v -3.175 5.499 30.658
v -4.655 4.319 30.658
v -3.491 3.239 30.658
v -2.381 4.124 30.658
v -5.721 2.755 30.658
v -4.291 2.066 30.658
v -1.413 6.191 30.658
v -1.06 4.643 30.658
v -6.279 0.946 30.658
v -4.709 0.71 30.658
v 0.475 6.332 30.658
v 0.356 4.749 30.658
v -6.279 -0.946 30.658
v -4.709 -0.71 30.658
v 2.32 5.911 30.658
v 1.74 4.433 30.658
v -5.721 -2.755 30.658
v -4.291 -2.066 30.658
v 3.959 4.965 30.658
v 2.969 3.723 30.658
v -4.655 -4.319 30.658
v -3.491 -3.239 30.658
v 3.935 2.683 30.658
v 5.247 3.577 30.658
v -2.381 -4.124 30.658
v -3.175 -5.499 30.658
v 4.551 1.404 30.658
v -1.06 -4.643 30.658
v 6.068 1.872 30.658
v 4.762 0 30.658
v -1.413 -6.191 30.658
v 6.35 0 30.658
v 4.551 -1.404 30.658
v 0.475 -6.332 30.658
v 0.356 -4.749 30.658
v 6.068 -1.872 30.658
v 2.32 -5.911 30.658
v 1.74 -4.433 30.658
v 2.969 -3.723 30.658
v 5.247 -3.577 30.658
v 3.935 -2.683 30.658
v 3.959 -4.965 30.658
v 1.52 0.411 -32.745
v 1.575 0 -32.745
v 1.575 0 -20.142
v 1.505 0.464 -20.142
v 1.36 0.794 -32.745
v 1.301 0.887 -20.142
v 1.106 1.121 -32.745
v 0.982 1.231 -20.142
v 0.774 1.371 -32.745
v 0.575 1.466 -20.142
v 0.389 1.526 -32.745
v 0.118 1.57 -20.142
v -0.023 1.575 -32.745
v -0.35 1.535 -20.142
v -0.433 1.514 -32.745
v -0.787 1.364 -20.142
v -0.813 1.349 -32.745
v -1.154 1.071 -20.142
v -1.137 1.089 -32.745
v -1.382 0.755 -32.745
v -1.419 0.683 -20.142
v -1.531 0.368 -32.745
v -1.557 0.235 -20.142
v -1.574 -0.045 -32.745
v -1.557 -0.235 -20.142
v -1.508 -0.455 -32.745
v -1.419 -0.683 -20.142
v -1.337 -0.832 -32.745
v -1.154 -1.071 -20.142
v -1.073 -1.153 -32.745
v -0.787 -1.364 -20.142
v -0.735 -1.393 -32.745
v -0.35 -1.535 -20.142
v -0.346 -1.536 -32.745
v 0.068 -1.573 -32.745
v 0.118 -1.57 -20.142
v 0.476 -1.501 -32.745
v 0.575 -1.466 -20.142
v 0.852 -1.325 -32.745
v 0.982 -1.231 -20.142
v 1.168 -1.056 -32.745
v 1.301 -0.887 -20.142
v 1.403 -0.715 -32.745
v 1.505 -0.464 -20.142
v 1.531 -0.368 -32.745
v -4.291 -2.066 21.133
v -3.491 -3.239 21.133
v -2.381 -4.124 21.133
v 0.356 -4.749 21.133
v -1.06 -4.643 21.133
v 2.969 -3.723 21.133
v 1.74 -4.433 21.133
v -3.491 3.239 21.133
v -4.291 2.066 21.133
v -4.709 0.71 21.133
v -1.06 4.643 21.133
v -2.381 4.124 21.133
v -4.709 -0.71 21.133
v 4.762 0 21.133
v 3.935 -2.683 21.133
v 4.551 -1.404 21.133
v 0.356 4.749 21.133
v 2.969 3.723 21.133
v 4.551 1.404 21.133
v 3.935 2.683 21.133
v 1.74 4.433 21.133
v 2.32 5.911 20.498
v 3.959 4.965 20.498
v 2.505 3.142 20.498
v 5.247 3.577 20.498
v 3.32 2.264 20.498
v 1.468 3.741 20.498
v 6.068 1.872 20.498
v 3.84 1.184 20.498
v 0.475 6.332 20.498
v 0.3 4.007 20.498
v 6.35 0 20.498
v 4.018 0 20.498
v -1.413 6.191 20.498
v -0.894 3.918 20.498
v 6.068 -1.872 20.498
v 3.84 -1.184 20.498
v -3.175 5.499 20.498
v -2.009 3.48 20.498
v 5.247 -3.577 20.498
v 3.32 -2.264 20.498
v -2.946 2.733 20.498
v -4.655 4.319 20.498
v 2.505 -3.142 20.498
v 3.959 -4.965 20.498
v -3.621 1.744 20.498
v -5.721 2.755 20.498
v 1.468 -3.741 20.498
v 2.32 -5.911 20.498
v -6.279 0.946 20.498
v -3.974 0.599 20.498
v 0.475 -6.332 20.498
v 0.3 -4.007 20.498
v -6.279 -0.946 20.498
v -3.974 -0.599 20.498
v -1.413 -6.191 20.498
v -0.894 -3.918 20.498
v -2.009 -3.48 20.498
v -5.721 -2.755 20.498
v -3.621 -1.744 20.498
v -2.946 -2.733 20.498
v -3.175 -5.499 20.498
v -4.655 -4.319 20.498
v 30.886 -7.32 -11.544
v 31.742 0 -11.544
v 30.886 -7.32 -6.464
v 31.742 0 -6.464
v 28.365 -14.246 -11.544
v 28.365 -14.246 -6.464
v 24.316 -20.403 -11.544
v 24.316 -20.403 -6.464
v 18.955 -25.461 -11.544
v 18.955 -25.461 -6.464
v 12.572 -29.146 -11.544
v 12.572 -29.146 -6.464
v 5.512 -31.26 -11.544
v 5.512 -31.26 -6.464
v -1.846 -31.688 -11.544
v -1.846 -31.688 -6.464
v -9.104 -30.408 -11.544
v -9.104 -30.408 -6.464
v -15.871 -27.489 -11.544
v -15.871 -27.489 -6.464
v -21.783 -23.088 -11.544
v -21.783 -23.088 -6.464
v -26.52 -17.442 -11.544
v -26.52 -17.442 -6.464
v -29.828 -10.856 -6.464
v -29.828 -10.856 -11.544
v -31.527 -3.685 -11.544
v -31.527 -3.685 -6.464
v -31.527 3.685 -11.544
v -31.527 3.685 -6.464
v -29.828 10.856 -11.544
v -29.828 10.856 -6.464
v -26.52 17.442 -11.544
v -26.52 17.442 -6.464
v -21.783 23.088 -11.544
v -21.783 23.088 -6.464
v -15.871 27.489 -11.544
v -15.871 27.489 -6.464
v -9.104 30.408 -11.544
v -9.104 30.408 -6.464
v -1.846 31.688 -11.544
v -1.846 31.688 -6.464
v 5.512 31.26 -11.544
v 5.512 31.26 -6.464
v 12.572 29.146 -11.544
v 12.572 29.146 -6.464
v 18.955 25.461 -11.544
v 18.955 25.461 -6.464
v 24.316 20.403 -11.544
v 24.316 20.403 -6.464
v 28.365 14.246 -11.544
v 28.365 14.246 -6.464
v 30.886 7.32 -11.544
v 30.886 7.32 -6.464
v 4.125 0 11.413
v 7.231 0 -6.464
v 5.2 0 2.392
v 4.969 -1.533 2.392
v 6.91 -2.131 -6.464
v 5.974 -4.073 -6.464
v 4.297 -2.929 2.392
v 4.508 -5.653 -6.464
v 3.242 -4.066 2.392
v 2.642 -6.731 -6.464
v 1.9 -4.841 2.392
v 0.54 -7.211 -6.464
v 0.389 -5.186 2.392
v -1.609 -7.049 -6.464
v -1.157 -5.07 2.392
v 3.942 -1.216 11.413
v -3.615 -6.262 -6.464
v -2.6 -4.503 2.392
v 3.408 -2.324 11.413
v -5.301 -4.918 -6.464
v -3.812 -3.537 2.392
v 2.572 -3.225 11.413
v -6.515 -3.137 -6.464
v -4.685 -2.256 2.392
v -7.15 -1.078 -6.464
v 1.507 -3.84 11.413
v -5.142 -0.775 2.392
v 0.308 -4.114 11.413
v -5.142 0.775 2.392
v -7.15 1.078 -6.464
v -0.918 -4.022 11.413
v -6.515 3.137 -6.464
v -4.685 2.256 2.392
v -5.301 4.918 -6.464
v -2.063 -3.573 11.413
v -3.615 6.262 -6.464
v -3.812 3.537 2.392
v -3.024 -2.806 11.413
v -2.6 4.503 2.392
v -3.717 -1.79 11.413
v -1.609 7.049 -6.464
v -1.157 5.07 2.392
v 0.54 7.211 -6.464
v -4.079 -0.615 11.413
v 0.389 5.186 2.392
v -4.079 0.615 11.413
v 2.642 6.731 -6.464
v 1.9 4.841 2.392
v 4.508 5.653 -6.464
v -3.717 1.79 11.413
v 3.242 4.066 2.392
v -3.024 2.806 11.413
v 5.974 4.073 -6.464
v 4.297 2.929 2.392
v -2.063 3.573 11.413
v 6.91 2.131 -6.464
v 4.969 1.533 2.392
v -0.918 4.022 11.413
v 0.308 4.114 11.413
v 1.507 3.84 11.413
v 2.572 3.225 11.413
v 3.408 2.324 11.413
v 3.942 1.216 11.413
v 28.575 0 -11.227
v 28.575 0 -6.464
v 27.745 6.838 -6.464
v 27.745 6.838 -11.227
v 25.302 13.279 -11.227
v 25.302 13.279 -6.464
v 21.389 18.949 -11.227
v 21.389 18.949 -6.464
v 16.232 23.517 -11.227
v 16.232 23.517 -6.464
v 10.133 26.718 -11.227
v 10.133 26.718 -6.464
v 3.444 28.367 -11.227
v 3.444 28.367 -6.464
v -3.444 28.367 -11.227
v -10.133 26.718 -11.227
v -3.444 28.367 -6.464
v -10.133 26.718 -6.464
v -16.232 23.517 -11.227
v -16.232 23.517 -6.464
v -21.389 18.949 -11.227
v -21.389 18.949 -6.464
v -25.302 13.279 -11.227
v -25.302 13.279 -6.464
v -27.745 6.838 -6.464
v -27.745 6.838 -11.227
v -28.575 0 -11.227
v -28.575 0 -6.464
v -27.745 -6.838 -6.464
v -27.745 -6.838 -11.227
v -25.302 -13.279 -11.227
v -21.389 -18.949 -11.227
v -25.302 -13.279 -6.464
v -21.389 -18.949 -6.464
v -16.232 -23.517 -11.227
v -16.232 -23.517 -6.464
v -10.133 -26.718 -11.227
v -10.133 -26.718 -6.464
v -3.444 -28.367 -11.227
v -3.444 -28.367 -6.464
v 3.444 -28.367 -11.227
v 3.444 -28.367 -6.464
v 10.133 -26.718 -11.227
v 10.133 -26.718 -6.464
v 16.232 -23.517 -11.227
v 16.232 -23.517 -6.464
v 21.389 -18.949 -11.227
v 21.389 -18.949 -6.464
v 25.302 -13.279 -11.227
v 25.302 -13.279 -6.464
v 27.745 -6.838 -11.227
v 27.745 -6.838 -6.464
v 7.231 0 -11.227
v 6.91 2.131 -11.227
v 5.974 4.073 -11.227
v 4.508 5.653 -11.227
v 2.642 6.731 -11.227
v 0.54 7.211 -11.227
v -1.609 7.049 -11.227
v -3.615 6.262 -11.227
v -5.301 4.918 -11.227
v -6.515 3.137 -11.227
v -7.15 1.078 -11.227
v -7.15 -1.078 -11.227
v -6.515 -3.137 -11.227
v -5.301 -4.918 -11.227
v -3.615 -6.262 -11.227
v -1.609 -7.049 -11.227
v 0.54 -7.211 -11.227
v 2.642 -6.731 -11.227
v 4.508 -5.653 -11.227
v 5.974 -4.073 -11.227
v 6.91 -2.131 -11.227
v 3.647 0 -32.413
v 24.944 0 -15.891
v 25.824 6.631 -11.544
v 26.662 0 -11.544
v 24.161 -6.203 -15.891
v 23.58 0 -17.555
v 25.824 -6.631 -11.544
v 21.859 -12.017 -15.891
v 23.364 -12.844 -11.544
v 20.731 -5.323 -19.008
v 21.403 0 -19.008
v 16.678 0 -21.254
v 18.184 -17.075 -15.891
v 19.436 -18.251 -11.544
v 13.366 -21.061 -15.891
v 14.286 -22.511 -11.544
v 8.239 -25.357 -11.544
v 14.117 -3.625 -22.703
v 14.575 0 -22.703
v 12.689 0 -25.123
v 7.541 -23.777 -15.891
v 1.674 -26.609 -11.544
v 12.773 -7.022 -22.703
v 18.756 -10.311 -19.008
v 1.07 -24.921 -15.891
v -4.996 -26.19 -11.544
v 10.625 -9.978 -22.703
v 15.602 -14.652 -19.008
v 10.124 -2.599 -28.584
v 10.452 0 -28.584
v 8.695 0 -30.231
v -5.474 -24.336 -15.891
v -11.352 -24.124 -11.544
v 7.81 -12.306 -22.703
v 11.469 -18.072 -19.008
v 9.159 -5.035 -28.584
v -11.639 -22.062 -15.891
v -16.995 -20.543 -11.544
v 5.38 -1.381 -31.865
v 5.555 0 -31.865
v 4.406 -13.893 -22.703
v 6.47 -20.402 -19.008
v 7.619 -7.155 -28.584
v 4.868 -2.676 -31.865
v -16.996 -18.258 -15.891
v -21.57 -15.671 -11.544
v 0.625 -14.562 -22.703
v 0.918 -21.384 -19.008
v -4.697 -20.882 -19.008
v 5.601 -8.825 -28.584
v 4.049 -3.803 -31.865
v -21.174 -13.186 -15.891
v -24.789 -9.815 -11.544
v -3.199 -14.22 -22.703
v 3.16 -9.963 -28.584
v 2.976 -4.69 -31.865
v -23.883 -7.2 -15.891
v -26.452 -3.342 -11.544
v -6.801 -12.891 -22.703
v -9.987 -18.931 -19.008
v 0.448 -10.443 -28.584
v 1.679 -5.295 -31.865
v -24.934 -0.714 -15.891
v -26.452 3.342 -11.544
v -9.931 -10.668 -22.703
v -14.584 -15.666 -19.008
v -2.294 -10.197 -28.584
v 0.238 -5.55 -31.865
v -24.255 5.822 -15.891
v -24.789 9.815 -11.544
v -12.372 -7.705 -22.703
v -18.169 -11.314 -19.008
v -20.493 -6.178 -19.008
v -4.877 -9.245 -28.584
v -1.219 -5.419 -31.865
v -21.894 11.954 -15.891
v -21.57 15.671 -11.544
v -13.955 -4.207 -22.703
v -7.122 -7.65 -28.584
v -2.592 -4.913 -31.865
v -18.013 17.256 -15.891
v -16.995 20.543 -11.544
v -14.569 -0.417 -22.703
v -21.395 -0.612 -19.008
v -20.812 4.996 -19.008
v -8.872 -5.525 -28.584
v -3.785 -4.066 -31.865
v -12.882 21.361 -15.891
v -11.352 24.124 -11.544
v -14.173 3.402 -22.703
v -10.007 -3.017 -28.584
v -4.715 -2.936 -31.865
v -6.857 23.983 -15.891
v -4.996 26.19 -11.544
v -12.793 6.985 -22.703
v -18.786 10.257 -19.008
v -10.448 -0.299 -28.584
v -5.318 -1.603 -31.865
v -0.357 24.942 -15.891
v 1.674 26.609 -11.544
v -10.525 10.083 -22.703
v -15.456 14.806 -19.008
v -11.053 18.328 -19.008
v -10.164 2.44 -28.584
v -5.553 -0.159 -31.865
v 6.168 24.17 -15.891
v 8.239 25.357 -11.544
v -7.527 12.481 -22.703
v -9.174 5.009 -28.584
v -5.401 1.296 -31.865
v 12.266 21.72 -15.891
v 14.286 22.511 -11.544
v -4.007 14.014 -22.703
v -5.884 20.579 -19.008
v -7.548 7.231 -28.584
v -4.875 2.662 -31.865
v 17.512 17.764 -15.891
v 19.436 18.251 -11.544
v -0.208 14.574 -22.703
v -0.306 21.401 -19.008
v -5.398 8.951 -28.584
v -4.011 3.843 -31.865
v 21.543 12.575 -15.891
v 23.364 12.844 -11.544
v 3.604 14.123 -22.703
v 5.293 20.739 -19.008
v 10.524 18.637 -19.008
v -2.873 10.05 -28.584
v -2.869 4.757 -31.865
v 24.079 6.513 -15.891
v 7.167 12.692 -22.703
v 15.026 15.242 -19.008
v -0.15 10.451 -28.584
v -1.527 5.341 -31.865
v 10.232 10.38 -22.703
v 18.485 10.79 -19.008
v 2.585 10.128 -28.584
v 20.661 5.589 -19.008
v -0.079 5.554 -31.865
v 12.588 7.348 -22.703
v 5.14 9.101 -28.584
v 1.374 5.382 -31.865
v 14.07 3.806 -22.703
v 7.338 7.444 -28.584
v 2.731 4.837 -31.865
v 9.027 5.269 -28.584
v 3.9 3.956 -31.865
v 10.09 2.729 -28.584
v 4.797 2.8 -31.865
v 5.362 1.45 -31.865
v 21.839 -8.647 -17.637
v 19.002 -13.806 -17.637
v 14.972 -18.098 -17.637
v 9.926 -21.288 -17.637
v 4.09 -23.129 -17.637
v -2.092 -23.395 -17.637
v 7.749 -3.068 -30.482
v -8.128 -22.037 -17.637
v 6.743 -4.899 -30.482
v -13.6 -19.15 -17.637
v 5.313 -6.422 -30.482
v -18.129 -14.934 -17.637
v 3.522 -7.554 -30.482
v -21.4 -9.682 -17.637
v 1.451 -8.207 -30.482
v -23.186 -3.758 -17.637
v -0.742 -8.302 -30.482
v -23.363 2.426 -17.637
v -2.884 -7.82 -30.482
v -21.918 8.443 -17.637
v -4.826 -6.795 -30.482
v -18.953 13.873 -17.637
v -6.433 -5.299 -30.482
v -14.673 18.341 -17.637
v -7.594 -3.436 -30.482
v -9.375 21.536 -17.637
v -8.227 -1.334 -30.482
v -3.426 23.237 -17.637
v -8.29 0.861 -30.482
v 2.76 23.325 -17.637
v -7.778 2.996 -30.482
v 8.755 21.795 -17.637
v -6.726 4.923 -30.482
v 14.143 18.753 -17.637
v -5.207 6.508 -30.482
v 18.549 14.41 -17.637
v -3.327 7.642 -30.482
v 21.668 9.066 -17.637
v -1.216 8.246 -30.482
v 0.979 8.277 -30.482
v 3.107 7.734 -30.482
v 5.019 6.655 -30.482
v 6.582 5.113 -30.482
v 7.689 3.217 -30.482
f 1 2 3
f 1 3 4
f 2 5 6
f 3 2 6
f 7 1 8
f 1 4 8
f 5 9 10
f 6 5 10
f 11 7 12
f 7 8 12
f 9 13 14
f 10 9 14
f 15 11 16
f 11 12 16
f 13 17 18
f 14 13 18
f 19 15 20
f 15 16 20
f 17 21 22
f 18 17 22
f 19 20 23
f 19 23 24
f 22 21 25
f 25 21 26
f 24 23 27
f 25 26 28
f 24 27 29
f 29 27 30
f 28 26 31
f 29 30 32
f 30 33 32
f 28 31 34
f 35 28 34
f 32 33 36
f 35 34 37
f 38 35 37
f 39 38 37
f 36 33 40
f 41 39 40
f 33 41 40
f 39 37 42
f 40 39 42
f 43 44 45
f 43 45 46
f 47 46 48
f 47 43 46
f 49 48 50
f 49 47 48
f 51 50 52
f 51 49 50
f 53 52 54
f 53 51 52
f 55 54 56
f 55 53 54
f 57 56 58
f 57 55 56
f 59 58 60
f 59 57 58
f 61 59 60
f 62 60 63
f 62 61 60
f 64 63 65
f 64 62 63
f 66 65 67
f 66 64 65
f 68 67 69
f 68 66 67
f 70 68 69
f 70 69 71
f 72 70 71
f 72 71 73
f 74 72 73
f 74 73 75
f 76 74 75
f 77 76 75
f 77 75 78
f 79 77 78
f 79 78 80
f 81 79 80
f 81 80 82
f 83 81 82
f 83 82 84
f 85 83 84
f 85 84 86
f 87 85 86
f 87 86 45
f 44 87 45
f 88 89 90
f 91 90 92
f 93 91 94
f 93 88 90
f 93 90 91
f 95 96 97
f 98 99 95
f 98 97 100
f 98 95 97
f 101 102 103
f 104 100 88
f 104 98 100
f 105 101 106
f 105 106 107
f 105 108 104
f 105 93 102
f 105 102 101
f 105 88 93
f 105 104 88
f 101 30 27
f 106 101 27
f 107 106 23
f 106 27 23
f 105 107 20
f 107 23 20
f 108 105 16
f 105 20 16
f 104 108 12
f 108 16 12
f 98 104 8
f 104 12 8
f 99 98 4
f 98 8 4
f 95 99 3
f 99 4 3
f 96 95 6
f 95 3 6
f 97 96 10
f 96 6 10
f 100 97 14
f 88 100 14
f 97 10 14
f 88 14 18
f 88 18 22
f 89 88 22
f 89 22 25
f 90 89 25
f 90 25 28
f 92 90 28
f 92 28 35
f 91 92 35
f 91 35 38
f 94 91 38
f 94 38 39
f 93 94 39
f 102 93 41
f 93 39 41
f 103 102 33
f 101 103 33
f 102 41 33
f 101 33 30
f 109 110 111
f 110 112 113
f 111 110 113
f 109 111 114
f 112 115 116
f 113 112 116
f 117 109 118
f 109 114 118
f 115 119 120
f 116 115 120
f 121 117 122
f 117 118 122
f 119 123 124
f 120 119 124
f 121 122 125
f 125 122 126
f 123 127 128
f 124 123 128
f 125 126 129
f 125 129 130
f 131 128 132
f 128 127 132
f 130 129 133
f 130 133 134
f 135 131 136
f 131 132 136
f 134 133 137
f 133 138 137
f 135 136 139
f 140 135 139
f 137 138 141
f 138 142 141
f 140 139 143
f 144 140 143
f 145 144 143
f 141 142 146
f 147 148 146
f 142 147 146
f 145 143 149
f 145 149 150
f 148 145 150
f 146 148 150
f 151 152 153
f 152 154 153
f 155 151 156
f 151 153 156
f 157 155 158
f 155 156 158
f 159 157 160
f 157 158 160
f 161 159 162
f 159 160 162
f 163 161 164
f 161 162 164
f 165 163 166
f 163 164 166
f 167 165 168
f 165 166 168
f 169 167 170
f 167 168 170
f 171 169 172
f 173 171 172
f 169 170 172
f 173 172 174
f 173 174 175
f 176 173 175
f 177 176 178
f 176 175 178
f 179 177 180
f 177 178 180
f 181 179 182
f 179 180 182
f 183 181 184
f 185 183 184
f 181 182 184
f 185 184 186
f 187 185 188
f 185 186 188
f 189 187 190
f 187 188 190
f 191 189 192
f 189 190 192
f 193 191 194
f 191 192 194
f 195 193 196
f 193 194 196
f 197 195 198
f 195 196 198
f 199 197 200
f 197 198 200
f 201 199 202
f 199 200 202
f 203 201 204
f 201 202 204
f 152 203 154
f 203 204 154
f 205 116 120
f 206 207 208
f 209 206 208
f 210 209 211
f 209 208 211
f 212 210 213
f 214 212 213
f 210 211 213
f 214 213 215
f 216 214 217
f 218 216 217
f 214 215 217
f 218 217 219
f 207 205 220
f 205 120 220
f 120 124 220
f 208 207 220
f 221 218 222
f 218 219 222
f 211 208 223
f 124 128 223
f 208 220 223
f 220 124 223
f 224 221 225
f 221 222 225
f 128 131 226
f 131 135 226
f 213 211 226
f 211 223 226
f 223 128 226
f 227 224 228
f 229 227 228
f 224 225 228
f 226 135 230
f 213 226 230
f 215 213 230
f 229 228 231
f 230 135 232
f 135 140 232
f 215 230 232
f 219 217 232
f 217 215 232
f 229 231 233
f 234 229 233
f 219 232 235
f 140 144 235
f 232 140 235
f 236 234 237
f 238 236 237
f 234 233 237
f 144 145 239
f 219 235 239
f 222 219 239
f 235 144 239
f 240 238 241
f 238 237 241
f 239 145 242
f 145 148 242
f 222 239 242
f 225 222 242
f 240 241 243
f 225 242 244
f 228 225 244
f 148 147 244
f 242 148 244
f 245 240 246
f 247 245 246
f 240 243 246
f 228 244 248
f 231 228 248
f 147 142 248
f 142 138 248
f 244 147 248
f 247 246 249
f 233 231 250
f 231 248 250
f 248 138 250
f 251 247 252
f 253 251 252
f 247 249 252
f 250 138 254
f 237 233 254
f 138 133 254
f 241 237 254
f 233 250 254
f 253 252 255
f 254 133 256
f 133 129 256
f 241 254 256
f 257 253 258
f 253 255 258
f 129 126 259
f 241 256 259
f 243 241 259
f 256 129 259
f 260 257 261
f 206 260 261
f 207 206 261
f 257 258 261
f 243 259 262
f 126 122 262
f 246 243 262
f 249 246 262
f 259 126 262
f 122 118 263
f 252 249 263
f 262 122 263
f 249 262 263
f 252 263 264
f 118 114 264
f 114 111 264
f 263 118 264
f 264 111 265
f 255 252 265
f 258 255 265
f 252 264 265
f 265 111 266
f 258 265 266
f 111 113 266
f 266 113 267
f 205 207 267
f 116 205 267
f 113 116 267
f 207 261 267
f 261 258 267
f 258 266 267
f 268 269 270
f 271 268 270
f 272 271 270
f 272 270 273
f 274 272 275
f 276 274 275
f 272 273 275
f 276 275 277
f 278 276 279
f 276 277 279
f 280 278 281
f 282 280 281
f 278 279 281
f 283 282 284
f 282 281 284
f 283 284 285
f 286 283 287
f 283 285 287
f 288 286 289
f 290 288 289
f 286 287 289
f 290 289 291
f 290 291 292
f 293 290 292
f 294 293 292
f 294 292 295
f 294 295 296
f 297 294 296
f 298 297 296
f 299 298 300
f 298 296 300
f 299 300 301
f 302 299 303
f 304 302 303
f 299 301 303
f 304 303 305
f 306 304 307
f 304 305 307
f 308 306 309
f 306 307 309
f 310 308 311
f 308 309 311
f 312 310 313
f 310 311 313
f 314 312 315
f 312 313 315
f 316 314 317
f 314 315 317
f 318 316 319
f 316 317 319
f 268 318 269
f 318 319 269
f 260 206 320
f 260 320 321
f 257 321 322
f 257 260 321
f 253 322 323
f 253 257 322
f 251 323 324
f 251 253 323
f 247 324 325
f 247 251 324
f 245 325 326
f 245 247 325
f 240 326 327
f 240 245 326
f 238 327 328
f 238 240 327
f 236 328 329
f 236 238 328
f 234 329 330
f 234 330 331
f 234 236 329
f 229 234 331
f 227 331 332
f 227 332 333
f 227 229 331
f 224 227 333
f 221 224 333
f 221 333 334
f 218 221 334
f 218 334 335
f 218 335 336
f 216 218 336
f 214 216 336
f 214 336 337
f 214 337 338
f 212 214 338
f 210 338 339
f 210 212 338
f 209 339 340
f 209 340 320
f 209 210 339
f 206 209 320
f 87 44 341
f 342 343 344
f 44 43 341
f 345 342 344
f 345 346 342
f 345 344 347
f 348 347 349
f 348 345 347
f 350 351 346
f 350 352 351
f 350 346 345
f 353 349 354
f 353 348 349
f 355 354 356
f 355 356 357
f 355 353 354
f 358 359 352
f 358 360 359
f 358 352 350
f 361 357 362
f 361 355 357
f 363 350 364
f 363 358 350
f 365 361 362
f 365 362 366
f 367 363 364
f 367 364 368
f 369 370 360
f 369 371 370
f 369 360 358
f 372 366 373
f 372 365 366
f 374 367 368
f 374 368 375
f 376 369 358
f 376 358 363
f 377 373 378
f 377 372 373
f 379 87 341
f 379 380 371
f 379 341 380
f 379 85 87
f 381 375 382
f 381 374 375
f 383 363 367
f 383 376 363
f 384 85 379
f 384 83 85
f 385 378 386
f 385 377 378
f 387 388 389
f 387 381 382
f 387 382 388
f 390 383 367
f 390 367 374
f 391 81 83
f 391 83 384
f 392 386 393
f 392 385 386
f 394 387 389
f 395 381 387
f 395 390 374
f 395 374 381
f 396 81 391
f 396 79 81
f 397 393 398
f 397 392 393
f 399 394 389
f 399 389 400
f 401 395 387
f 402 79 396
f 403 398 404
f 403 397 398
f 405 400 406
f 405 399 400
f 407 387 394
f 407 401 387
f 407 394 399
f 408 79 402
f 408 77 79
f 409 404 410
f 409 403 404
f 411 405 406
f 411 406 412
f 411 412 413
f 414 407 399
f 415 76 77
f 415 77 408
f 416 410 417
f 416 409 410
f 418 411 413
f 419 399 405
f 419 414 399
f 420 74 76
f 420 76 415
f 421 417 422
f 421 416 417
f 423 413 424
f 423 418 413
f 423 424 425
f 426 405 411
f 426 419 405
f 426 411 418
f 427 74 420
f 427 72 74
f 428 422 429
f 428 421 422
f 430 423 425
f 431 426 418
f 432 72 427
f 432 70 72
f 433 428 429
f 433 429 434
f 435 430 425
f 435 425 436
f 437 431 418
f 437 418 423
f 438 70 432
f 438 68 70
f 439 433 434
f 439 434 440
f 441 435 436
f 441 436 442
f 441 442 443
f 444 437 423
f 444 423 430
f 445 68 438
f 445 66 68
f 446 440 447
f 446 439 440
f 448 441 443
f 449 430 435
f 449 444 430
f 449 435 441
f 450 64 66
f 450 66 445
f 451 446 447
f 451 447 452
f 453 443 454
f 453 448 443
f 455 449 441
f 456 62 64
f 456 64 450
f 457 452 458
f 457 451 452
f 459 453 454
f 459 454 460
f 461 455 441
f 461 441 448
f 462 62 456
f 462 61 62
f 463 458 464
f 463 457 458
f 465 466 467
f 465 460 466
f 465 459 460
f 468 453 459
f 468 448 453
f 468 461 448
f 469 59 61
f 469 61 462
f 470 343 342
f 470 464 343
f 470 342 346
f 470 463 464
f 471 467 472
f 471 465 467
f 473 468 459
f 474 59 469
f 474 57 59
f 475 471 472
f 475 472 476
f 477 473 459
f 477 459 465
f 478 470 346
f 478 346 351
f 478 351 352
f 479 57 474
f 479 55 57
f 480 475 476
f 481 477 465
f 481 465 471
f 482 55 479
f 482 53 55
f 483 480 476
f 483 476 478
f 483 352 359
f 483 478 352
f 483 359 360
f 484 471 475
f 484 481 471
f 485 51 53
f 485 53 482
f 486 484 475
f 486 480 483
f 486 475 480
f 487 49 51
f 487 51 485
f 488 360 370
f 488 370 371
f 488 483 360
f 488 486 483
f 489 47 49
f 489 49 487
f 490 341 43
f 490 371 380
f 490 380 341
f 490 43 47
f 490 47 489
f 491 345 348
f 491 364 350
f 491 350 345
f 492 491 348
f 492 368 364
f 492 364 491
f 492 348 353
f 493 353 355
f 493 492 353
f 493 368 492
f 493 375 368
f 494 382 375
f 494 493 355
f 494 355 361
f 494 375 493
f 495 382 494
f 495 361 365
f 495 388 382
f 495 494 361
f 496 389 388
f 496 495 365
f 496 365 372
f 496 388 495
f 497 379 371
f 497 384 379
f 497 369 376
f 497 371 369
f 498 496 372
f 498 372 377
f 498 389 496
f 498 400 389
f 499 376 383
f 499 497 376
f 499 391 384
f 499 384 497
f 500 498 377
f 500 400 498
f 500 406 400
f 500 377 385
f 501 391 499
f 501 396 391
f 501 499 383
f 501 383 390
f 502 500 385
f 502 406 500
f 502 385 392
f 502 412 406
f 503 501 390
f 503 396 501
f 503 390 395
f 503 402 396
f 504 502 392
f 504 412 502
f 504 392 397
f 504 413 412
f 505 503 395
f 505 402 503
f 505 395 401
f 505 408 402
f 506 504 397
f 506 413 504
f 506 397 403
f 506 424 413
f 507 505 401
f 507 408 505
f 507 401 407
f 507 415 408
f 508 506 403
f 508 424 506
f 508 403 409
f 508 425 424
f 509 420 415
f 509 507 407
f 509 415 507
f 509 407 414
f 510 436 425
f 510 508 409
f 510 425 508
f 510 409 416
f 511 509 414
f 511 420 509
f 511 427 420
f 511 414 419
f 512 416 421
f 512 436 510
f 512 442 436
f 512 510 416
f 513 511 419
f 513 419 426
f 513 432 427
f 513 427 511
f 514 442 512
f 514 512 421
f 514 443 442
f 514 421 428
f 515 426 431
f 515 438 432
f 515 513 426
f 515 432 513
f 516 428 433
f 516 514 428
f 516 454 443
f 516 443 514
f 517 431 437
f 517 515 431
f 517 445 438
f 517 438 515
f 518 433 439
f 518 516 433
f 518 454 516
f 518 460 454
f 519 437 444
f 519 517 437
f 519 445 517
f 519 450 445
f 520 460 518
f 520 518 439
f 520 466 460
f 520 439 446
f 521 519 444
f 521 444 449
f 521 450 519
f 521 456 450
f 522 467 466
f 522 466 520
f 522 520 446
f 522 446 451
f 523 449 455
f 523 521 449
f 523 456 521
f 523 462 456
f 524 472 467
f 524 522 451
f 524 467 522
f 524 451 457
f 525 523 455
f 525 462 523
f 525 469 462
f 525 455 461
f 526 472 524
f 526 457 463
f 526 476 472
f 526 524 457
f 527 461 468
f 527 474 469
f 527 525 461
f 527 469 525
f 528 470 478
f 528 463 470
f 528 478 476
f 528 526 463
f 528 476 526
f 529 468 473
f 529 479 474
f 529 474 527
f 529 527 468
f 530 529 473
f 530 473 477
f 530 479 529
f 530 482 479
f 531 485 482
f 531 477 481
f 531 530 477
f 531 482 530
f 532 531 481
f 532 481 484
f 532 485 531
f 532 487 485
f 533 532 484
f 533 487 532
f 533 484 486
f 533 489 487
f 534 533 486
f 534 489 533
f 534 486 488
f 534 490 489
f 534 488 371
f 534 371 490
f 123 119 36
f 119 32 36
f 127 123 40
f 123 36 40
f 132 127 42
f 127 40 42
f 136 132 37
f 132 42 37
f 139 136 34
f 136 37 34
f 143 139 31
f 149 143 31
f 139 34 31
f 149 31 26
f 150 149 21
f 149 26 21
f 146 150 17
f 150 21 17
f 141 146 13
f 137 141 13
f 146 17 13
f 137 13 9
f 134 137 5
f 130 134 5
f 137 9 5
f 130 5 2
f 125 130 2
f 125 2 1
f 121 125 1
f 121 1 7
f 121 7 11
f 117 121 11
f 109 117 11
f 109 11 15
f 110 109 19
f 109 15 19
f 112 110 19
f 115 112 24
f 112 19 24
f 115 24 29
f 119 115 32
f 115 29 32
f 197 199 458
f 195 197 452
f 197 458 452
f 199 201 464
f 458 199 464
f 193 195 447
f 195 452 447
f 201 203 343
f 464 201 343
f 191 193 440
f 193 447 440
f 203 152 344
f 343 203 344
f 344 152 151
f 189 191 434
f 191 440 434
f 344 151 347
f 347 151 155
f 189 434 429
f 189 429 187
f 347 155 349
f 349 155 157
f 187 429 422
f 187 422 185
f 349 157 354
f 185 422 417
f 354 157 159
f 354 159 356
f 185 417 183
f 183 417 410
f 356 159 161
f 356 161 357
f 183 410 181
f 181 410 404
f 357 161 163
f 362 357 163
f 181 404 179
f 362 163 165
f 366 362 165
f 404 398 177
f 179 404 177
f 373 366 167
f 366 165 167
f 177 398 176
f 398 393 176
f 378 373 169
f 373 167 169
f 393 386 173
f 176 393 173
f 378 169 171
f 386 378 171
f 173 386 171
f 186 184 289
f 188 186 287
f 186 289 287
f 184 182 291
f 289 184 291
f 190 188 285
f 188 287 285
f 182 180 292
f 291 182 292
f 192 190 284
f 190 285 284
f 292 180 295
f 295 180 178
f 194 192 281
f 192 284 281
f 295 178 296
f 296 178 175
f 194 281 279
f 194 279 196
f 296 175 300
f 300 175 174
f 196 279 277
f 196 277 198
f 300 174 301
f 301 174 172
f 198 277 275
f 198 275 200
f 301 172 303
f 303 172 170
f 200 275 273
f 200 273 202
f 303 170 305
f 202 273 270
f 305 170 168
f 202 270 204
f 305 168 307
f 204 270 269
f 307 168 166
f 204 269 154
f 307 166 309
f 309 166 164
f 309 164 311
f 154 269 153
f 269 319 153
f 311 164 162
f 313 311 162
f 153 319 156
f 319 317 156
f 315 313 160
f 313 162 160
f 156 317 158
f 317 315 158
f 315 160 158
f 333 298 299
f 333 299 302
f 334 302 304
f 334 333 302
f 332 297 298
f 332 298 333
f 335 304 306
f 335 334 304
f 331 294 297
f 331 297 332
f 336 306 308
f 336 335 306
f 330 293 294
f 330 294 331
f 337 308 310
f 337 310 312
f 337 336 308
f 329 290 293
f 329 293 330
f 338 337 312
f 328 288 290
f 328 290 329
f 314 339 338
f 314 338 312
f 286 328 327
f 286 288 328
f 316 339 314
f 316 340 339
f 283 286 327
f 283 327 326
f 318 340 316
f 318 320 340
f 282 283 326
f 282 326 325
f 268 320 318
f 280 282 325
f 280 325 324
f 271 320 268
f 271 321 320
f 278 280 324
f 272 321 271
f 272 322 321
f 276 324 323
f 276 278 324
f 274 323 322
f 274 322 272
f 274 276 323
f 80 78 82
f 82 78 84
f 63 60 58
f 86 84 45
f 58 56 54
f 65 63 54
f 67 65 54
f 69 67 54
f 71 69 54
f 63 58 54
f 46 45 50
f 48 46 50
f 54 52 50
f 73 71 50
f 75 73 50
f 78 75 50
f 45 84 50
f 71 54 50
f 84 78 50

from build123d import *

# Parameters (mm, degrees)
F2_R     = 4.7625
F3_DEPTH = 9.525
F4_R     = 28.575
F4_R_2   = 7.2307717055
F5_DEPTH = 4.7625
F7_R     = 1.5748
F8_DEPTH = 12.7


with BuildPart() as f1:
    # F0 (on Front) → F1 (revolve)
    with BuildSketch(Plane.XZ):
        with BuildLine():
            Line((6.35, 30.6578), (0, 30.6578))
            Line((0, 30.6578), (0, -32.8422))
            add(Edge.make_bspline(
                [(26.6617717055, -11.54401084), (25.9700992248, -13.9315858764), (24.3509477459, -18.9185989779), (13.5455112354, -21.3365708537), (11.0916920313, -30.0749376041), (4.3225063677, -32.7455812088), (0, -32.8422)],
                knots=[0, 0, 0, 0, 0.2244865459, 0.4859344501, 0.7233610009, 1, 1, 1, 1], degree=3))
            Line((26.6617717055, -11.54401084), (31.7417717055, -11.54401084))
            Line((31.7417717055, -11.54401084), (31.7417717055, -6.46401084))
            Line((31.7417717055, -6.46401084), (7.2307717055, -6.46401084))
            ThreePointArc((7.2307717055, -6.46401084), (4.5421623899, 6.8879276474), (4.018467851, 20.4978))
            Line((4.018467851, 20.4978), (6.35, 20.4978))
            Line((6.35, 20.4978), (6.35, 30.6578))
        make_face()
    revolve(axis=Axis((0, 0, -1.0922), (0, 0, -1)))

    # F2 (on face) → F3 (cut)
    with BuildSketch(Plane.XY.offset(30.6578)):
        Circle(F2_R)
    extrude(amount=-F3_DEPTH, mode=Mode.SUBTRACT)

    # F4 (on face) → F5 (cut)
    with BuildSketch(Plane.XY.offset(-6.46401084)):
        Circle(F4_R)
        Circle(F4_R_2, mode=Mode.SUBTRACT)
    extrude(amount=-F5_DEPTH, mode=Mode.SUBTRACT)

    # F7 (on offset) → F8 (cut)
    with BuildSketch(Plane.XY.offset(-32.8422)):
        Circle(F7_R)
    extrude(amount=F8_DEPTH, mode=Mode.SUBTRACT)


solid = f1.part
